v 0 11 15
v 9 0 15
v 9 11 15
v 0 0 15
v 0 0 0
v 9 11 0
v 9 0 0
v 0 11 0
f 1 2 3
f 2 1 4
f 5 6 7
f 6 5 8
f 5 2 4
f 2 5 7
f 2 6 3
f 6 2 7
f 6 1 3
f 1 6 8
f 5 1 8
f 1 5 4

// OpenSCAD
// Generated by SolidPython 1.0.1 on 2020-07-29 00:39:26


cube(size = [9, 11, 15]);
/***********************************************
*********      SolidPython code:      **********
************************************************
 
# import packages: SolidPython
from solid import *
from solid.utils import *
from itertools import chain, combinations


class Resize:

    def __init__(self, scad_file):
        self.scad_file = scad_file
        #self.scad_file = import_scad(scad_file)
        # cone/cylinder param:
        self.r1 = 0
        self.r2 = 0
        self.h = 0
        # rectangular prism param:
        self.w = 0
        self.l = 0
        # ellipse param:
        self.r = 0

    # import OpenScad code (file name corresponds to shape)


    # classify shape + parameters
    def assign(self, param1, param2, param3):
        if self.scad_file == 'cone.scad':
            self.r1 = param1
            self.r2 = param2
            self.h = param3
        elif self.scad_file == 'cylinder.scad':
            self.r1 = param1
            self.r2 = param2
            self.h = param3
        elif self.scad_file == 'rectangularPrism.scad':
            self.h = param1
            self.l = param2
            self.w = param3
        else:
            self.r = param1
            self.h = param2

    # resize parameters
    def iterate(self):
        x = range(3, 20, 2)
        i = 1
        if self.scad_file == 'cone.scad':
            tempList = list(combinations(x, 2))
            for temp in tempList:
                param1 = temp[0]
                param2 = temp[1]
                filepath = 'produced_scad_files/' + 'cone' + str(param1) + '_' + str(param2) + '_' + '.scad'
                scad_render_to_file(cylinder(h=param1, r1=param2, r2=0), filepath)

        elif self.scad_file == 'cylinder.scad':
            tempList = list(combinations(x, 3))
            for temp in tempList:
                param1 = temp[0]
                param2 = temp[1]
                filepath = 'produced_scad_files/' + 'cylinder' + str(param1) + '_' + str(param2) + '_' + '.scad'
                scad_render_to_file(cylinder(h=param1, r1=param2, r2=param2), filepath)

        elif self.scad_file == 'rectangularPrism.scad':
            tempList = list(combinations(x, 3))
            for temp in tempList:
                param1 = temp[0]
                param2 = temp[1]
                param3 = temp[2]
                filepath = 'produced_scad_files/' + 'rectangularPrism' + str(param1) + '_' + str(param2) + '_' + str(
                    param3) + '.scad'
                scad_render_to_file(cube(size=(param1, param2, param3)), filepath)

        elif self.scad_file == 'ellipse.scad':
            tempList = list(combinations(x, 4))
            for temp in tempList:
                param1 = temp[0]
                param2 = temp[1]
                param3 = temp[2]
                param4 = temp[3]
                filepath = 'produced_scad_files/' + 'ellipse' + str(param1) + '_' + str(param2) + '_' + str(param3) + '_' + str(param4) + '.scad'
                scad_render_to_file(scale([param1, param2, param3])(sphere(r=param4)), filepath)

    def render_to_scadfile(self):
        scad_render_to_file(scad, 'example.scad') 
 
************************************************/
